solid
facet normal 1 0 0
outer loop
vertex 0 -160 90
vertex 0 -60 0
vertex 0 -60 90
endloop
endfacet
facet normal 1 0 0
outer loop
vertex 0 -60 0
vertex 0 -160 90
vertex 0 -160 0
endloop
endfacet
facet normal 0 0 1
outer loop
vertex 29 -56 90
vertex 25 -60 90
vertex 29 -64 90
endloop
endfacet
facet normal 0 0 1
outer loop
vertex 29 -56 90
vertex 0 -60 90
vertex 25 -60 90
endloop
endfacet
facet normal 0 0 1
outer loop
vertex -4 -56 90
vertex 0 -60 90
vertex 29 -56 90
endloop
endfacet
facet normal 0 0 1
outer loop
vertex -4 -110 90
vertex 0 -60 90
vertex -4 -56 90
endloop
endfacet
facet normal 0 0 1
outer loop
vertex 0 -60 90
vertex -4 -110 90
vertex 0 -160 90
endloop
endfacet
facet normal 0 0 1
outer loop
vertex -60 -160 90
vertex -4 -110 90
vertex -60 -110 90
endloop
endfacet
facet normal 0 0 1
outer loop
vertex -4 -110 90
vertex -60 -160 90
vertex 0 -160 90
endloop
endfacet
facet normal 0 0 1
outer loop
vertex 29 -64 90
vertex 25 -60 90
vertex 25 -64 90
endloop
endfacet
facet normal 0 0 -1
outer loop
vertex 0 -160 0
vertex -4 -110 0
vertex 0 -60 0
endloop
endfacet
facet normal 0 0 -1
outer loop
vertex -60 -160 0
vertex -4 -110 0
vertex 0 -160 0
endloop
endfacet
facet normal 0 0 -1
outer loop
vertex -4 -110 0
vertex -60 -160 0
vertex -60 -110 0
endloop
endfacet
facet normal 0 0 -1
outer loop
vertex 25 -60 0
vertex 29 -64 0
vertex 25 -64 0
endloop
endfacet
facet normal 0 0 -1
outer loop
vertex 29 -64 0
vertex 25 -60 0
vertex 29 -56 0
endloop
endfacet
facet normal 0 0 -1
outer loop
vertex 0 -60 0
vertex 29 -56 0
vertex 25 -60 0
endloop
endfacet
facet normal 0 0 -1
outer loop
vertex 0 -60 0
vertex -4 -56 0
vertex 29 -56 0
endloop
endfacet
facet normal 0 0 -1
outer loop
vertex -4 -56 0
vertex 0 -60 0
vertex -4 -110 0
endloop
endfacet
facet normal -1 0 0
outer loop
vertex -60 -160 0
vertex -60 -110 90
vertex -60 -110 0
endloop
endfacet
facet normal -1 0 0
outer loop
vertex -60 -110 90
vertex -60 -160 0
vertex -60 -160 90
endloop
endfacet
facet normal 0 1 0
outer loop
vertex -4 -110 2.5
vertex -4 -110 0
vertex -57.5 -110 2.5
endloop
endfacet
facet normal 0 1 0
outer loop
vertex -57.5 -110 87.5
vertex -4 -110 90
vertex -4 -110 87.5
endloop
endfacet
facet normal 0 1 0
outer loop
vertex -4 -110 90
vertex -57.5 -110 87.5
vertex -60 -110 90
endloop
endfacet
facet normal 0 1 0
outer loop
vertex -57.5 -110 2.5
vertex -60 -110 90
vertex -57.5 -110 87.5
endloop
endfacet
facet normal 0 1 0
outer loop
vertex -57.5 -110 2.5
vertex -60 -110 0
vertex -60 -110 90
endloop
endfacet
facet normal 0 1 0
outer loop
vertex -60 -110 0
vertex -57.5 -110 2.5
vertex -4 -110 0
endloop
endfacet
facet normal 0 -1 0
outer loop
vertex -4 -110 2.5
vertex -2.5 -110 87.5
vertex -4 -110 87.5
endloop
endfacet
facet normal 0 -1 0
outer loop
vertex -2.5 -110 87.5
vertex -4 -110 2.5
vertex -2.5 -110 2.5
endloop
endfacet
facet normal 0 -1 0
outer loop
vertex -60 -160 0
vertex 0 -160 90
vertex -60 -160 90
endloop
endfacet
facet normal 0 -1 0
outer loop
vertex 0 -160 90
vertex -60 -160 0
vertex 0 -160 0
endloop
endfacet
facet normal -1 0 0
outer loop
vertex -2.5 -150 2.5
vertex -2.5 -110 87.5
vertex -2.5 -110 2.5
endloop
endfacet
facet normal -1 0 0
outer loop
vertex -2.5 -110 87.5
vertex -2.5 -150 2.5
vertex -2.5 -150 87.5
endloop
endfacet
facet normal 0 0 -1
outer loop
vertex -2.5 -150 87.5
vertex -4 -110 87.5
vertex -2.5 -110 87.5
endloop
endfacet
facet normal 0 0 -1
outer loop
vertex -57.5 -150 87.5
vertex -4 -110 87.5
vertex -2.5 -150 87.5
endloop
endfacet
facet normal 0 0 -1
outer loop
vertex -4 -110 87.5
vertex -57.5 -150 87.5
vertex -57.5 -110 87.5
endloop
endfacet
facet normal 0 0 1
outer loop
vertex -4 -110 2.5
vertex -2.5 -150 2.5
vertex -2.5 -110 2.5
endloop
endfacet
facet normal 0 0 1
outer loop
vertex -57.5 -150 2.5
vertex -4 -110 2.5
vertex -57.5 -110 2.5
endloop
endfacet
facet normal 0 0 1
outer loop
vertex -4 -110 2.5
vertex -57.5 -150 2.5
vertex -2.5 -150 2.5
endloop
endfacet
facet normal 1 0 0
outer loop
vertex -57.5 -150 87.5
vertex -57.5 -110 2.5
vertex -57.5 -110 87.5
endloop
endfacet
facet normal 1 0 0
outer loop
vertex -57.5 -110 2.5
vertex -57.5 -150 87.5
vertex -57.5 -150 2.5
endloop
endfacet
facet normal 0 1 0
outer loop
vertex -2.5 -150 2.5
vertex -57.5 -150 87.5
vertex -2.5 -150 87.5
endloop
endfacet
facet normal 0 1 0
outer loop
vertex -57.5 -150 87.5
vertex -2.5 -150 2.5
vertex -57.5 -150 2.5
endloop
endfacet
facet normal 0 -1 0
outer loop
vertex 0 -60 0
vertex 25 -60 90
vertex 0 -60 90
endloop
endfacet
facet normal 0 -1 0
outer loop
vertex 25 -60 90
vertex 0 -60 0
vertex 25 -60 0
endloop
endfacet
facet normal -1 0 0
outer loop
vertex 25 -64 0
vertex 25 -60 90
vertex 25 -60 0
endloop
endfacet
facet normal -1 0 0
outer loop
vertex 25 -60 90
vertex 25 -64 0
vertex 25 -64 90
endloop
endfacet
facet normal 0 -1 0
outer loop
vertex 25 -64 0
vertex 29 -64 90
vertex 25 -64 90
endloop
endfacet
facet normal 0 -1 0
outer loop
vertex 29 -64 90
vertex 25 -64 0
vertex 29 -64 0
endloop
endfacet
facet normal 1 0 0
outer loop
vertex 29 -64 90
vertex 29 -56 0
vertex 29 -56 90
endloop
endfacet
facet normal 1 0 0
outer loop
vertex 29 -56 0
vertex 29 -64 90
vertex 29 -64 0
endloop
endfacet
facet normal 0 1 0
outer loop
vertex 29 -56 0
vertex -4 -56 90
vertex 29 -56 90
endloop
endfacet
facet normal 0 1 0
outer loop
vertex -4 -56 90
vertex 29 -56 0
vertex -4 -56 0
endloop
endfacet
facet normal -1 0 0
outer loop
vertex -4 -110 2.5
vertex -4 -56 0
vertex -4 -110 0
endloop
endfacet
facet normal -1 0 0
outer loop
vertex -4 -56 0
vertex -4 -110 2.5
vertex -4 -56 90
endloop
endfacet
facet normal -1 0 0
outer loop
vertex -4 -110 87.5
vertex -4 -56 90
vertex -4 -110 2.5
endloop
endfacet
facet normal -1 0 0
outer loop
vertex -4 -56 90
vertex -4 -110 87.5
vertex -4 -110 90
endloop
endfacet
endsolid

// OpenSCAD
    
linear_extrude (height=90, $fn = 200)
import (file="profil.dxf", layer="2", $fn=500);




translate([-60,-160,0])
    difference(){
        cube ([60,50,90]);
        translate([2.5,10,2.5])
            cube ([55,45,85]);
    }
    
    
   
